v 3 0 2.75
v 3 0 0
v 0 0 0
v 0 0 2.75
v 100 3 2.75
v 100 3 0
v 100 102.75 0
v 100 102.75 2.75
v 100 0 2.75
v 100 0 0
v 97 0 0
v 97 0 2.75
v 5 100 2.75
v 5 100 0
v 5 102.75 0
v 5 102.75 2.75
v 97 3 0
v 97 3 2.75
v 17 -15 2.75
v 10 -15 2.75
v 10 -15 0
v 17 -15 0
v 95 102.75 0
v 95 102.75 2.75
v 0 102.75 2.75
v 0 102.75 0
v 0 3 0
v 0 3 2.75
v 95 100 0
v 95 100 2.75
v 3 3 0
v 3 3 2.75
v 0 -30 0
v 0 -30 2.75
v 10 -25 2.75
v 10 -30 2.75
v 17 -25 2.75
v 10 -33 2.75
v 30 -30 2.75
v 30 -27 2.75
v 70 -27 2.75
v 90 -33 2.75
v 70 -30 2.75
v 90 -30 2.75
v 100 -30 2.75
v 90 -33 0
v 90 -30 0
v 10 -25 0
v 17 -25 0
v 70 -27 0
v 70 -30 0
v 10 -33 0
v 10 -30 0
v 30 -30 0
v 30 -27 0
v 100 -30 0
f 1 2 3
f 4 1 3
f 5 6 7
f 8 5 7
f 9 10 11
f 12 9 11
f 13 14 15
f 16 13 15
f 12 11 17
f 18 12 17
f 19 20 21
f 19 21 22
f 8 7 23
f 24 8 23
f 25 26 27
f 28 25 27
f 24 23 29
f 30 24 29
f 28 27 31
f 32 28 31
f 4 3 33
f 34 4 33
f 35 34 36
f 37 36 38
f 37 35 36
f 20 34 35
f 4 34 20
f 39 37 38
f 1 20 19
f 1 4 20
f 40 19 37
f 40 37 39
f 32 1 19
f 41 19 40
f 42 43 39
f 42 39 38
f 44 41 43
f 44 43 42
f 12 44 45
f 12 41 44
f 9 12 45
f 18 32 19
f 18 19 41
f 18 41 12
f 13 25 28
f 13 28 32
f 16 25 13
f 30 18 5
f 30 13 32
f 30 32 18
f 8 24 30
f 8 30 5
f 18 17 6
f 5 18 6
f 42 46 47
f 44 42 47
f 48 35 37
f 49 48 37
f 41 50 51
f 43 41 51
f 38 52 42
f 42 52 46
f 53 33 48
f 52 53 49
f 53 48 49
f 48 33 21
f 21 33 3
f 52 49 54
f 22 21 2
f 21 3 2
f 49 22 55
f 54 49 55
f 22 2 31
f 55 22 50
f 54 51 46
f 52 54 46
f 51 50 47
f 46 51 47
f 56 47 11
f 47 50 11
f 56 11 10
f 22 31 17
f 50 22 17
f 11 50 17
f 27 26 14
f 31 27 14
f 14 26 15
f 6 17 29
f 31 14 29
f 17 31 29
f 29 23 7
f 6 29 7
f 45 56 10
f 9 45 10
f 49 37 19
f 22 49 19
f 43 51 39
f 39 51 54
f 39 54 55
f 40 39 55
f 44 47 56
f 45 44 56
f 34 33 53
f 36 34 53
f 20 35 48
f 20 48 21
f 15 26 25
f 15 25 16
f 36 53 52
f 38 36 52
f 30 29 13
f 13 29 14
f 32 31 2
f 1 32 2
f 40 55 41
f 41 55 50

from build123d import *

# Parameters (mm, degrees)
SKETCH_1_W          = 5
SKETCH_1_H          = 2.75
EXTRUDE_1_DEPTH     = 2.75
SKETCH_2_W          = 7
SKETCH_2_H          = 10
CUT_EXTRUDE_1_DEPTH = 10


with BuildPart() as part:
    # 草图1 → 凸台-拉伸1 (new body)
    with BuildSketch(Plane.XY):
        Polygon((95, 100), (100, 100), (100, 102.75), (95, 102.75), (95, 102.449578136), align=None)
        Polygon((3, 3), (3, 0), (97, 0), (97, 3), (100, 3), (100, 100), (95, 100), (5, 100), (0, 100), (0, 3), align=None)
        with Locations((2.5, 101.375)):
            Rectangle(SKETCH_1_W, SKETCH_1_H)
        Polygon((0, 0), (0, -30), (10, -30), (30, -30), (30, -27), (50, -27), (70, -27), (70, -30), (90, -30), (100, -30), (100, 0), (97, 0), (3, 0), align=None)
        Polygon((30, -30), (10, -30), (10, -33), (90, -33), (90, -30), (70, -30), (50, -30), align=None)
    extrude(amount=EXTRUDE_1_DEPTH)

    # 草图2 → 切除-拉伸1 (cut)
    with BuildSketch(Plane.XY.offset(2.75)):
        with Locations((13.5, -20)):
            Rectangle(SKETCH_2_W, SKETCH_2_H)
    extrude(amount=-CUT_EXTRUDE_1_DEPTH, mode=Mode.SUBTRACT)


solid = part.part
